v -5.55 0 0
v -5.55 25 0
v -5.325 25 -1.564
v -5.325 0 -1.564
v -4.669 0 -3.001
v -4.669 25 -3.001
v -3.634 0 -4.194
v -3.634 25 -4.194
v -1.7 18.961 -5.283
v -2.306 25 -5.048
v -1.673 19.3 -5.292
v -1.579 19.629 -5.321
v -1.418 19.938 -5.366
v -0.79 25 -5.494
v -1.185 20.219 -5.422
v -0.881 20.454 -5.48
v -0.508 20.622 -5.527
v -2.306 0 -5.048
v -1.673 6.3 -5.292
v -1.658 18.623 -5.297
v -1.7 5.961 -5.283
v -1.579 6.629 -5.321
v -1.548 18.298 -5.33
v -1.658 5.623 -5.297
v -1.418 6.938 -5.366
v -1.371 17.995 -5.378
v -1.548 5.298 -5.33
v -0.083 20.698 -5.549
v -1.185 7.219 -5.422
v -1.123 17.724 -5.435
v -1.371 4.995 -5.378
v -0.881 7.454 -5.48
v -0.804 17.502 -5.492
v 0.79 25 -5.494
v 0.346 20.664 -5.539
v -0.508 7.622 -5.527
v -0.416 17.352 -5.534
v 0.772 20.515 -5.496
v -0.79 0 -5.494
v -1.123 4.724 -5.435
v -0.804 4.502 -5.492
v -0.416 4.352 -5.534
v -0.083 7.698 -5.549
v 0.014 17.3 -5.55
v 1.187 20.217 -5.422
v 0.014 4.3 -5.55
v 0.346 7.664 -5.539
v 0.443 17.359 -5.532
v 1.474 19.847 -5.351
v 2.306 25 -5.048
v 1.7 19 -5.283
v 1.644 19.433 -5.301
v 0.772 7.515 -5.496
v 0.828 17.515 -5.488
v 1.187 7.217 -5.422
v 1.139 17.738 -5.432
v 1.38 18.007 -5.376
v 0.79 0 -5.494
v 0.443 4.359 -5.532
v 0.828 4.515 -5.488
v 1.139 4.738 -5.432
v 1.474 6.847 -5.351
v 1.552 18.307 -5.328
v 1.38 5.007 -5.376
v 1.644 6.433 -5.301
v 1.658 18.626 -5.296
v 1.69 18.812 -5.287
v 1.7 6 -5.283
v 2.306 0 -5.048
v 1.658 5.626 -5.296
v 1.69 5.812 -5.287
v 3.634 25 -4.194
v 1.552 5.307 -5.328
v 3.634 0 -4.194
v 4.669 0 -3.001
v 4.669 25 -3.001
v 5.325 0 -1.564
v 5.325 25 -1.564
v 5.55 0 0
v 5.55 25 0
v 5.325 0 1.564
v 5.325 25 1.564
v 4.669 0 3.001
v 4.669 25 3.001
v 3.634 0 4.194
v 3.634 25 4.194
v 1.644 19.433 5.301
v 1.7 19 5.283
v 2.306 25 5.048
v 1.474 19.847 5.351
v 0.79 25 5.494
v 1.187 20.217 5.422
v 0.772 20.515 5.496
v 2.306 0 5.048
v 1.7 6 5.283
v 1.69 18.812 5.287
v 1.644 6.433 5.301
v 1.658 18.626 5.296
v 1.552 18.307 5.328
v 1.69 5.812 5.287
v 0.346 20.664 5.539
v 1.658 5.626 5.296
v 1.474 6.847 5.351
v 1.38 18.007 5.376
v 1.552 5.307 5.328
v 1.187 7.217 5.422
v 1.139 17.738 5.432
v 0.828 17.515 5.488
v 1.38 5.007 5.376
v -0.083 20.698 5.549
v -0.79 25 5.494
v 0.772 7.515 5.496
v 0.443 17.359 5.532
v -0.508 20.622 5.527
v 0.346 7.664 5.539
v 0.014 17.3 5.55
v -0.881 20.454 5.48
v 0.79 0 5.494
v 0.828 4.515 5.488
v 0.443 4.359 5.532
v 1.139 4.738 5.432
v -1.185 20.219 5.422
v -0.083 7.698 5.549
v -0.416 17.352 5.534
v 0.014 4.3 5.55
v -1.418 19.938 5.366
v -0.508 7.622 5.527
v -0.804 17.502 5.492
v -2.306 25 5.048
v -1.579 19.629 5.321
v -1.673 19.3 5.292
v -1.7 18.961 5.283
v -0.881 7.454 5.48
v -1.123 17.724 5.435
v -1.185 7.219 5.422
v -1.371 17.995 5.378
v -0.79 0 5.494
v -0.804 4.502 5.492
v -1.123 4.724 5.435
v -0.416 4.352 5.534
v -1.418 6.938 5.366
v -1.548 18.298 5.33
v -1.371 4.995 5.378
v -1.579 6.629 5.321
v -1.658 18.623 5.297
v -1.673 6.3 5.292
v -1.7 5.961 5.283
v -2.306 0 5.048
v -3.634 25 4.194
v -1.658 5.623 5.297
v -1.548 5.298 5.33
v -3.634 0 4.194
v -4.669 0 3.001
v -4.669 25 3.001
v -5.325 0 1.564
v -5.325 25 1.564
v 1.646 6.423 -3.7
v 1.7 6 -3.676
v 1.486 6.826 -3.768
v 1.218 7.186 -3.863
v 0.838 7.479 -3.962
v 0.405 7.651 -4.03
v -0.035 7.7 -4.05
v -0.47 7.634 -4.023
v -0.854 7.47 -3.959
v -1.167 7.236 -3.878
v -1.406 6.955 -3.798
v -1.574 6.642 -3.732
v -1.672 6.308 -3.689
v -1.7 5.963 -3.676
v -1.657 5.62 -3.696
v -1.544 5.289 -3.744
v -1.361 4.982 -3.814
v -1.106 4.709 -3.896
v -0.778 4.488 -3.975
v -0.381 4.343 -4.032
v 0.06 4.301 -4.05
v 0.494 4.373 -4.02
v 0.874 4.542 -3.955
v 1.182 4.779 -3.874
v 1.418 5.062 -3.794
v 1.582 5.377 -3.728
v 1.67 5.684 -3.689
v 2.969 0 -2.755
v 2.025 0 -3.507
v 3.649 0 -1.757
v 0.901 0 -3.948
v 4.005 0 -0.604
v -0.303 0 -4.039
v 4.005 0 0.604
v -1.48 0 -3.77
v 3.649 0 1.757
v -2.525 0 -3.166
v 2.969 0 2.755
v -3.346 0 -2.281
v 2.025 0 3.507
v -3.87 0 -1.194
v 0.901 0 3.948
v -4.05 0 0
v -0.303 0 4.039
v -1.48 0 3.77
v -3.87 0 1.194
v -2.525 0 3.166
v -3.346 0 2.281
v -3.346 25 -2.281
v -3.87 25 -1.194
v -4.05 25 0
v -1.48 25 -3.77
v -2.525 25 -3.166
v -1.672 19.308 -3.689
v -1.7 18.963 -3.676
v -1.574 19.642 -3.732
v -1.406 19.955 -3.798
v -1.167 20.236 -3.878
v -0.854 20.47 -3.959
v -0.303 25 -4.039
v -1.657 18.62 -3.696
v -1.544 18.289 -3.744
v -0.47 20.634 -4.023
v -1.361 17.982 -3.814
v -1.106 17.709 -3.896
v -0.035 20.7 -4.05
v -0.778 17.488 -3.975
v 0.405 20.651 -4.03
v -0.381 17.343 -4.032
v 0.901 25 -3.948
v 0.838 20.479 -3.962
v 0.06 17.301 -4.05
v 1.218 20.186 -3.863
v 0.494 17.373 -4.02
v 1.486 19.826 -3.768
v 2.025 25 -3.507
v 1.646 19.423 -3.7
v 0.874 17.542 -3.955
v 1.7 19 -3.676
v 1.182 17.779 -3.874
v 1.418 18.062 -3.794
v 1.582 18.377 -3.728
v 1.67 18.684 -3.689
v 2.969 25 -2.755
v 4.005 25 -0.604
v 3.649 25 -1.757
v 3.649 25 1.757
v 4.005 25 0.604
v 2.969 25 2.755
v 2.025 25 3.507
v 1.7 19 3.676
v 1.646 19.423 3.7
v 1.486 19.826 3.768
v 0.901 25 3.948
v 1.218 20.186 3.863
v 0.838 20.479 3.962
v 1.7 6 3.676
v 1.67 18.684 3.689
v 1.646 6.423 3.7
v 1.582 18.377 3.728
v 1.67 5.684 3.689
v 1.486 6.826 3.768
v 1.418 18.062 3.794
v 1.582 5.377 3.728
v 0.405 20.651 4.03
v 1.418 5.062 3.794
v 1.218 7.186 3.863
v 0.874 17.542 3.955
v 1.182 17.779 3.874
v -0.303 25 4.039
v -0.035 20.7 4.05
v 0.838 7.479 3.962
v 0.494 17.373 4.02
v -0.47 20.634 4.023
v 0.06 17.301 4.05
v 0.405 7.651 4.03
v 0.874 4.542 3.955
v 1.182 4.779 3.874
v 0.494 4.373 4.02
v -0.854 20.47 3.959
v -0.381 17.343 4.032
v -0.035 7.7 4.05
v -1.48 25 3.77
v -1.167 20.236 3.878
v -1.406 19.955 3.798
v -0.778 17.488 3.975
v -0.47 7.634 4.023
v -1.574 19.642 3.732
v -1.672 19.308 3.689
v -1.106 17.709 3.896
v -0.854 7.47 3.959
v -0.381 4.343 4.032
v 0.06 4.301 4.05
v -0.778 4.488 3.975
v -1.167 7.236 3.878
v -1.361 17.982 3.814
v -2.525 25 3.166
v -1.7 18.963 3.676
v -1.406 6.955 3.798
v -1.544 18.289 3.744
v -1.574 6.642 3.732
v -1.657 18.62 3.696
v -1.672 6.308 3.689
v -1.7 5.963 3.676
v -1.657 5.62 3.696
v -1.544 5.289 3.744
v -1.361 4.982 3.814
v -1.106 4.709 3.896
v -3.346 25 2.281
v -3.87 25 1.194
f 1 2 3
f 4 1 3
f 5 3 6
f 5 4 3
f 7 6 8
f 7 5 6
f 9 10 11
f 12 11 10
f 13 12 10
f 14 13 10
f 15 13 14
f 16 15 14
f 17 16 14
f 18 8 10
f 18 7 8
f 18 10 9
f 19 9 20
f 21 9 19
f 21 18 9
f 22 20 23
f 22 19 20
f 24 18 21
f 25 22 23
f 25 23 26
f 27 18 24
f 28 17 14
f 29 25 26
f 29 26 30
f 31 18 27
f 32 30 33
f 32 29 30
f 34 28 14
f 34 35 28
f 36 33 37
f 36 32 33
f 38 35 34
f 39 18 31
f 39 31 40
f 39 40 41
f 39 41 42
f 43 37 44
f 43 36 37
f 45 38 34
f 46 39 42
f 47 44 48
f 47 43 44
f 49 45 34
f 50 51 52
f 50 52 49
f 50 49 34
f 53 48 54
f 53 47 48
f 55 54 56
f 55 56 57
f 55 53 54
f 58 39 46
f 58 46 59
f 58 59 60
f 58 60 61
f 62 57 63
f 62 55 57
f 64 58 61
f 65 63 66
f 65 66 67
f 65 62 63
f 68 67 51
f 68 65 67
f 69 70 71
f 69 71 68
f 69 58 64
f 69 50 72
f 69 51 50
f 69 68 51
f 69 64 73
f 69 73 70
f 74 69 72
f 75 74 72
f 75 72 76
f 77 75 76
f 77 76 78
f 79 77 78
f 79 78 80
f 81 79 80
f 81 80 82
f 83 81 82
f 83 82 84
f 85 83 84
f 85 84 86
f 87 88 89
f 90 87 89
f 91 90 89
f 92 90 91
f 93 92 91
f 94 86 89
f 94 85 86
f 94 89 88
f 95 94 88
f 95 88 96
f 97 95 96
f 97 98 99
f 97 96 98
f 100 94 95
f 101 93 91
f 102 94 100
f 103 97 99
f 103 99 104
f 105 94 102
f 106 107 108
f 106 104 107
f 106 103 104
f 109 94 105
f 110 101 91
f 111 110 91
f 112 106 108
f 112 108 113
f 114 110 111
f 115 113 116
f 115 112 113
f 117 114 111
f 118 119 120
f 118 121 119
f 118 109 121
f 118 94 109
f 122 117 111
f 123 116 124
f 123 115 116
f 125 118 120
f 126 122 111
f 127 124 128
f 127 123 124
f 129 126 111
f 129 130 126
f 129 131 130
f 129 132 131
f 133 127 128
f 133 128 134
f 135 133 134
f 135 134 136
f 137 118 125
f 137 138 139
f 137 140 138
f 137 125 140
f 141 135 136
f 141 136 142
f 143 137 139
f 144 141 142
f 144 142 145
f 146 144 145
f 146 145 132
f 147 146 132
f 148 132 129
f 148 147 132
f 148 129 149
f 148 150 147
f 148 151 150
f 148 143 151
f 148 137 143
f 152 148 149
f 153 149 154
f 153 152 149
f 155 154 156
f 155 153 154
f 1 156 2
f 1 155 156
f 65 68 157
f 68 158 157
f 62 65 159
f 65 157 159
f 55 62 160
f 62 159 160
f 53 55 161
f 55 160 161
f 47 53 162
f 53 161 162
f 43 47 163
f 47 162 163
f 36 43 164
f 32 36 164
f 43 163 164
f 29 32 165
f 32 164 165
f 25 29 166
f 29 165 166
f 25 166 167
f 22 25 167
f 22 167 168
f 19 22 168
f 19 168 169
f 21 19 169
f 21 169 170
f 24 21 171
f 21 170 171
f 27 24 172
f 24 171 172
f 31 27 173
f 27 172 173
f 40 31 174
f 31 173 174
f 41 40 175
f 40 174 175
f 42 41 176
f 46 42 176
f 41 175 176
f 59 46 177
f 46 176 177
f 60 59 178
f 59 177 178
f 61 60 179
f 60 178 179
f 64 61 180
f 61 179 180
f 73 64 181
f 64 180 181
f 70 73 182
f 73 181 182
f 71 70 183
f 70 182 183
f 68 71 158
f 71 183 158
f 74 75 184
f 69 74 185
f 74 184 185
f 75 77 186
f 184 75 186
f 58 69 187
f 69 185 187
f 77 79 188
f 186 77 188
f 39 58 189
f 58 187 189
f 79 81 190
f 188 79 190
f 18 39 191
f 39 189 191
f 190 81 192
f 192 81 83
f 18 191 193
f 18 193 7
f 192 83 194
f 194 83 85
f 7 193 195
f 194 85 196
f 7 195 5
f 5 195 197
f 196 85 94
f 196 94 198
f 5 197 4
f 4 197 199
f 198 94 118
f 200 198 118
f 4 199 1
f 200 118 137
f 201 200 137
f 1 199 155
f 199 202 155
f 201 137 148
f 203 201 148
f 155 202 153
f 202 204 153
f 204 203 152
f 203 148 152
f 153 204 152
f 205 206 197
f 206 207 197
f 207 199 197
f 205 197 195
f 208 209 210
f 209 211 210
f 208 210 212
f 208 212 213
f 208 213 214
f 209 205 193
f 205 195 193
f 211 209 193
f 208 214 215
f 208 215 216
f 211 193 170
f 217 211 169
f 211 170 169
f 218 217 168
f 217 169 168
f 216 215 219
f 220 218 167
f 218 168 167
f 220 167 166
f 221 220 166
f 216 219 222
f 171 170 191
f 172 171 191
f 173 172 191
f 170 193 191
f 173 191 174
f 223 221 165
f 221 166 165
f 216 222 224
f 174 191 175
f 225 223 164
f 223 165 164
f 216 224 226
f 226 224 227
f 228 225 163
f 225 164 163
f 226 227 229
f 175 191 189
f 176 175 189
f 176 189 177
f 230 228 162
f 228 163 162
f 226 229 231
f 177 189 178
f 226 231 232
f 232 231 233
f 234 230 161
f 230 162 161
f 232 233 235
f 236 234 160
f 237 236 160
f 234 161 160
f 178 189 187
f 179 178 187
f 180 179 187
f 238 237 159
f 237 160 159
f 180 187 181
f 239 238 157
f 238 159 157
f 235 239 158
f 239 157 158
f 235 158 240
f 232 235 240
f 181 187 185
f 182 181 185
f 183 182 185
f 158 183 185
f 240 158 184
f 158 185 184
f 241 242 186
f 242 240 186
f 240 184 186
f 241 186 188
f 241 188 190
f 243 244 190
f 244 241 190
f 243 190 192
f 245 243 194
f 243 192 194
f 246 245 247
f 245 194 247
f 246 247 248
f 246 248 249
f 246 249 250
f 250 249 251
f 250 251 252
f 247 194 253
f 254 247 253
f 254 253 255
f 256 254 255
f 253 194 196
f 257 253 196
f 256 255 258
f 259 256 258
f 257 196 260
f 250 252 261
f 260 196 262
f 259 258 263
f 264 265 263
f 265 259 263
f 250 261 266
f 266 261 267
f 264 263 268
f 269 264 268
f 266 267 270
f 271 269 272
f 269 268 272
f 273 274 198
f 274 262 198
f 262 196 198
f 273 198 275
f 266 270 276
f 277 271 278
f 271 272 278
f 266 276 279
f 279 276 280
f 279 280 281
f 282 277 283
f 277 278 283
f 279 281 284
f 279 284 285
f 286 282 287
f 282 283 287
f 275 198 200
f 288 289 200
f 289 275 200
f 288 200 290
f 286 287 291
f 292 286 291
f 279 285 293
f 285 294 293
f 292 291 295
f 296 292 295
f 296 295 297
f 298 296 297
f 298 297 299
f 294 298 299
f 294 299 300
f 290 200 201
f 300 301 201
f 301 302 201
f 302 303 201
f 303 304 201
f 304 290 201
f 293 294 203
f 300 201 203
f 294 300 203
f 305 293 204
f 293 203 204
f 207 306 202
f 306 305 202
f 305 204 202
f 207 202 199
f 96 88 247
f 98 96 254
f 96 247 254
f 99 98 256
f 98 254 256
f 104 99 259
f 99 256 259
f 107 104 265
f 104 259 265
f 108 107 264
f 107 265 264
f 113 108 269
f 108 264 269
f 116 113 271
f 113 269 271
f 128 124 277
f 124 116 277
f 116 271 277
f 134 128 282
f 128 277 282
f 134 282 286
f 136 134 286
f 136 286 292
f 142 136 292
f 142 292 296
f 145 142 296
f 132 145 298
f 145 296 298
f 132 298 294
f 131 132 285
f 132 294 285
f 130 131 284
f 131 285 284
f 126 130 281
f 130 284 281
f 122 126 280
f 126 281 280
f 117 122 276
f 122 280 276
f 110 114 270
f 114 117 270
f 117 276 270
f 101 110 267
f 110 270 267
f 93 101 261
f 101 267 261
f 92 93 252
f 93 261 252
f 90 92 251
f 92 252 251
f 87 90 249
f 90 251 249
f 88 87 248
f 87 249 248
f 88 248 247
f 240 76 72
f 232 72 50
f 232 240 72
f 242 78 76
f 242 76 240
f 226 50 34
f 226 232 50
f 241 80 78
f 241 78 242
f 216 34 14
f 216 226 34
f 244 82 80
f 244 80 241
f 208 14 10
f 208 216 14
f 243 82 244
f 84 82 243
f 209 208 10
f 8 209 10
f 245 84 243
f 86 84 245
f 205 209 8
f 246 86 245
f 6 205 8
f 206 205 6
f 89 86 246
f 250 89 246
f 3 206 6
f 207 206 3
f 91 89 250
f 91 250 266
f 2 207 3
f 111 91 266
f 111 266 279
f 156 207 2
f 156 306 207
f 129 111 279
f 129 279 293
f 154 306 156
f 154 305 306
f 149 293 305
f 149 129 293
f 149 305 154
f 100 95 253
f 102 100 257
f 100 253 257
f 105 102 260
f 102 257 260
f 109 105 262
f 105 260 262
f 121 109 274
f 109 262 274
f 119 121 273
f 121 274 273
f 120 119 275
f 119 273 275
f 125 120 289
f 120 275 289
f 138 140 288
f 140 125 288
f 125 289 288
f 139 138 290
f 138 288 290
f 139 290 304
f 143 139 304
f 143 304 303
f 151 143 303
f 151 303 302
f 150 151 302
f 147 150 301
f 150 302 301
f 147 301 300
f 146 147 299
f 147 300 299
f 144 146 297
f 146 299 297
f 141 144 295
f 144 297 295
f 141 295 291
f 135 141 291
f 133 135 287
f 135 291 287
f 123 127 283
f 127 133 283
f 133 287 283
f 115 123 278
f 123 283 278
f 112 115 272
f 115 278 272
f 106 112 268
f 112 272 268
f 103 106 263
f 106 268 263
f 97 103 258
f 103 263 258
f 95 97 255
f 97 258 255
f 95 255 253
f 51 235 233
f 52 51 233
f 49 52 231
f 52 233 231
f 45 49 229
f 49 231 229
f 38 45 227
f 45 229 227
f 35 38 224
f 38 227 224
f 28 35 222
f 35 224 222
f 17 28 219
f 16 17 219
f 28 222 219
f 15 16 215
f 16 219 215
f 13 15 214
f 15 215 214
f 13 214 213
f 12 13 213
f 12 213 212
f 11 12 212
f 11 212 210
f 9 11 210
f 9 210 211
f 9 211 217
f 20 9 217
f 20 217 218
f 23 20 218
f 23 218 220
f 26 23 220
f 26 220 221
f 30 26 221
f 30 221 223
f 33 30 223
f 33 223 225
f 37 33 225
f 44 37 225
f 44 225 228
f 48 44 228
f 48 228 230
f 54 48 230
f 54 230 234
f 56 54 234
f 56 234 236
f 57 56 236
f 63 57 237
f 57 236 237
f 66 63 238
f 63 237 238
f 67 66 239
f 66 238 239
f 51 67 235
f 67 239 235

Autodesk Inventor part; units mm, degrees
ref_plane "YZ Plane" through (0, 0, 0) normal (1, 0, 0) x (0, 1, 0)
ref_plane "XZ Plane" through (0, 0, 0) normal (0, 1, 0) x (-1, 0, 0)
ref_plane "XY Plane" through (0, 0, 0) normal (0, 0, 1) x (1, 0, 0)
sketch "Sketch1" plane through (0, 0, 0) normal (0, 1, 0) x (-1, 0, 0)
  circle A0 centre (0, 0) radius 5.55
  circle A1 centre (0, 0) radius 4.05
  dimension "d0" = 11.1
  dimension "d1" = 8.1
extrude "Extrusion1" add sketch "Sketch1" along normal blind 25
sketch "Sketch2" plane through (0, 0, 0) normal (0, 0, 1) x (1, 0, 0)
  line L0 (5.55, 25) -> (-5.55, 25) projected
  line L1 (5.55, 0) -> (-5.55, 0) projected
  circle A0 centre (0, 6) radius 1.7
  line L2 (5.55, 0) -> (-5.55, 0) projected
  line L3 (-4.05, 25) -> (-4.05, 0) projected
  circle A1 centre (0, 19) radius 1.7
  point P0 (0, 0)
  point P1 (0, 25)
  dimension "d4" = 3.4
  dimension "d5" = 6
  dimension "d6" = 3.4
  dimension "d7" = 6
extrude "Extrusion2" cut sketch "Sketch2" along normal mid plane 25
properties part number "ACOMPLE_PLASTICO" material "Steel, Mild, Welded"
